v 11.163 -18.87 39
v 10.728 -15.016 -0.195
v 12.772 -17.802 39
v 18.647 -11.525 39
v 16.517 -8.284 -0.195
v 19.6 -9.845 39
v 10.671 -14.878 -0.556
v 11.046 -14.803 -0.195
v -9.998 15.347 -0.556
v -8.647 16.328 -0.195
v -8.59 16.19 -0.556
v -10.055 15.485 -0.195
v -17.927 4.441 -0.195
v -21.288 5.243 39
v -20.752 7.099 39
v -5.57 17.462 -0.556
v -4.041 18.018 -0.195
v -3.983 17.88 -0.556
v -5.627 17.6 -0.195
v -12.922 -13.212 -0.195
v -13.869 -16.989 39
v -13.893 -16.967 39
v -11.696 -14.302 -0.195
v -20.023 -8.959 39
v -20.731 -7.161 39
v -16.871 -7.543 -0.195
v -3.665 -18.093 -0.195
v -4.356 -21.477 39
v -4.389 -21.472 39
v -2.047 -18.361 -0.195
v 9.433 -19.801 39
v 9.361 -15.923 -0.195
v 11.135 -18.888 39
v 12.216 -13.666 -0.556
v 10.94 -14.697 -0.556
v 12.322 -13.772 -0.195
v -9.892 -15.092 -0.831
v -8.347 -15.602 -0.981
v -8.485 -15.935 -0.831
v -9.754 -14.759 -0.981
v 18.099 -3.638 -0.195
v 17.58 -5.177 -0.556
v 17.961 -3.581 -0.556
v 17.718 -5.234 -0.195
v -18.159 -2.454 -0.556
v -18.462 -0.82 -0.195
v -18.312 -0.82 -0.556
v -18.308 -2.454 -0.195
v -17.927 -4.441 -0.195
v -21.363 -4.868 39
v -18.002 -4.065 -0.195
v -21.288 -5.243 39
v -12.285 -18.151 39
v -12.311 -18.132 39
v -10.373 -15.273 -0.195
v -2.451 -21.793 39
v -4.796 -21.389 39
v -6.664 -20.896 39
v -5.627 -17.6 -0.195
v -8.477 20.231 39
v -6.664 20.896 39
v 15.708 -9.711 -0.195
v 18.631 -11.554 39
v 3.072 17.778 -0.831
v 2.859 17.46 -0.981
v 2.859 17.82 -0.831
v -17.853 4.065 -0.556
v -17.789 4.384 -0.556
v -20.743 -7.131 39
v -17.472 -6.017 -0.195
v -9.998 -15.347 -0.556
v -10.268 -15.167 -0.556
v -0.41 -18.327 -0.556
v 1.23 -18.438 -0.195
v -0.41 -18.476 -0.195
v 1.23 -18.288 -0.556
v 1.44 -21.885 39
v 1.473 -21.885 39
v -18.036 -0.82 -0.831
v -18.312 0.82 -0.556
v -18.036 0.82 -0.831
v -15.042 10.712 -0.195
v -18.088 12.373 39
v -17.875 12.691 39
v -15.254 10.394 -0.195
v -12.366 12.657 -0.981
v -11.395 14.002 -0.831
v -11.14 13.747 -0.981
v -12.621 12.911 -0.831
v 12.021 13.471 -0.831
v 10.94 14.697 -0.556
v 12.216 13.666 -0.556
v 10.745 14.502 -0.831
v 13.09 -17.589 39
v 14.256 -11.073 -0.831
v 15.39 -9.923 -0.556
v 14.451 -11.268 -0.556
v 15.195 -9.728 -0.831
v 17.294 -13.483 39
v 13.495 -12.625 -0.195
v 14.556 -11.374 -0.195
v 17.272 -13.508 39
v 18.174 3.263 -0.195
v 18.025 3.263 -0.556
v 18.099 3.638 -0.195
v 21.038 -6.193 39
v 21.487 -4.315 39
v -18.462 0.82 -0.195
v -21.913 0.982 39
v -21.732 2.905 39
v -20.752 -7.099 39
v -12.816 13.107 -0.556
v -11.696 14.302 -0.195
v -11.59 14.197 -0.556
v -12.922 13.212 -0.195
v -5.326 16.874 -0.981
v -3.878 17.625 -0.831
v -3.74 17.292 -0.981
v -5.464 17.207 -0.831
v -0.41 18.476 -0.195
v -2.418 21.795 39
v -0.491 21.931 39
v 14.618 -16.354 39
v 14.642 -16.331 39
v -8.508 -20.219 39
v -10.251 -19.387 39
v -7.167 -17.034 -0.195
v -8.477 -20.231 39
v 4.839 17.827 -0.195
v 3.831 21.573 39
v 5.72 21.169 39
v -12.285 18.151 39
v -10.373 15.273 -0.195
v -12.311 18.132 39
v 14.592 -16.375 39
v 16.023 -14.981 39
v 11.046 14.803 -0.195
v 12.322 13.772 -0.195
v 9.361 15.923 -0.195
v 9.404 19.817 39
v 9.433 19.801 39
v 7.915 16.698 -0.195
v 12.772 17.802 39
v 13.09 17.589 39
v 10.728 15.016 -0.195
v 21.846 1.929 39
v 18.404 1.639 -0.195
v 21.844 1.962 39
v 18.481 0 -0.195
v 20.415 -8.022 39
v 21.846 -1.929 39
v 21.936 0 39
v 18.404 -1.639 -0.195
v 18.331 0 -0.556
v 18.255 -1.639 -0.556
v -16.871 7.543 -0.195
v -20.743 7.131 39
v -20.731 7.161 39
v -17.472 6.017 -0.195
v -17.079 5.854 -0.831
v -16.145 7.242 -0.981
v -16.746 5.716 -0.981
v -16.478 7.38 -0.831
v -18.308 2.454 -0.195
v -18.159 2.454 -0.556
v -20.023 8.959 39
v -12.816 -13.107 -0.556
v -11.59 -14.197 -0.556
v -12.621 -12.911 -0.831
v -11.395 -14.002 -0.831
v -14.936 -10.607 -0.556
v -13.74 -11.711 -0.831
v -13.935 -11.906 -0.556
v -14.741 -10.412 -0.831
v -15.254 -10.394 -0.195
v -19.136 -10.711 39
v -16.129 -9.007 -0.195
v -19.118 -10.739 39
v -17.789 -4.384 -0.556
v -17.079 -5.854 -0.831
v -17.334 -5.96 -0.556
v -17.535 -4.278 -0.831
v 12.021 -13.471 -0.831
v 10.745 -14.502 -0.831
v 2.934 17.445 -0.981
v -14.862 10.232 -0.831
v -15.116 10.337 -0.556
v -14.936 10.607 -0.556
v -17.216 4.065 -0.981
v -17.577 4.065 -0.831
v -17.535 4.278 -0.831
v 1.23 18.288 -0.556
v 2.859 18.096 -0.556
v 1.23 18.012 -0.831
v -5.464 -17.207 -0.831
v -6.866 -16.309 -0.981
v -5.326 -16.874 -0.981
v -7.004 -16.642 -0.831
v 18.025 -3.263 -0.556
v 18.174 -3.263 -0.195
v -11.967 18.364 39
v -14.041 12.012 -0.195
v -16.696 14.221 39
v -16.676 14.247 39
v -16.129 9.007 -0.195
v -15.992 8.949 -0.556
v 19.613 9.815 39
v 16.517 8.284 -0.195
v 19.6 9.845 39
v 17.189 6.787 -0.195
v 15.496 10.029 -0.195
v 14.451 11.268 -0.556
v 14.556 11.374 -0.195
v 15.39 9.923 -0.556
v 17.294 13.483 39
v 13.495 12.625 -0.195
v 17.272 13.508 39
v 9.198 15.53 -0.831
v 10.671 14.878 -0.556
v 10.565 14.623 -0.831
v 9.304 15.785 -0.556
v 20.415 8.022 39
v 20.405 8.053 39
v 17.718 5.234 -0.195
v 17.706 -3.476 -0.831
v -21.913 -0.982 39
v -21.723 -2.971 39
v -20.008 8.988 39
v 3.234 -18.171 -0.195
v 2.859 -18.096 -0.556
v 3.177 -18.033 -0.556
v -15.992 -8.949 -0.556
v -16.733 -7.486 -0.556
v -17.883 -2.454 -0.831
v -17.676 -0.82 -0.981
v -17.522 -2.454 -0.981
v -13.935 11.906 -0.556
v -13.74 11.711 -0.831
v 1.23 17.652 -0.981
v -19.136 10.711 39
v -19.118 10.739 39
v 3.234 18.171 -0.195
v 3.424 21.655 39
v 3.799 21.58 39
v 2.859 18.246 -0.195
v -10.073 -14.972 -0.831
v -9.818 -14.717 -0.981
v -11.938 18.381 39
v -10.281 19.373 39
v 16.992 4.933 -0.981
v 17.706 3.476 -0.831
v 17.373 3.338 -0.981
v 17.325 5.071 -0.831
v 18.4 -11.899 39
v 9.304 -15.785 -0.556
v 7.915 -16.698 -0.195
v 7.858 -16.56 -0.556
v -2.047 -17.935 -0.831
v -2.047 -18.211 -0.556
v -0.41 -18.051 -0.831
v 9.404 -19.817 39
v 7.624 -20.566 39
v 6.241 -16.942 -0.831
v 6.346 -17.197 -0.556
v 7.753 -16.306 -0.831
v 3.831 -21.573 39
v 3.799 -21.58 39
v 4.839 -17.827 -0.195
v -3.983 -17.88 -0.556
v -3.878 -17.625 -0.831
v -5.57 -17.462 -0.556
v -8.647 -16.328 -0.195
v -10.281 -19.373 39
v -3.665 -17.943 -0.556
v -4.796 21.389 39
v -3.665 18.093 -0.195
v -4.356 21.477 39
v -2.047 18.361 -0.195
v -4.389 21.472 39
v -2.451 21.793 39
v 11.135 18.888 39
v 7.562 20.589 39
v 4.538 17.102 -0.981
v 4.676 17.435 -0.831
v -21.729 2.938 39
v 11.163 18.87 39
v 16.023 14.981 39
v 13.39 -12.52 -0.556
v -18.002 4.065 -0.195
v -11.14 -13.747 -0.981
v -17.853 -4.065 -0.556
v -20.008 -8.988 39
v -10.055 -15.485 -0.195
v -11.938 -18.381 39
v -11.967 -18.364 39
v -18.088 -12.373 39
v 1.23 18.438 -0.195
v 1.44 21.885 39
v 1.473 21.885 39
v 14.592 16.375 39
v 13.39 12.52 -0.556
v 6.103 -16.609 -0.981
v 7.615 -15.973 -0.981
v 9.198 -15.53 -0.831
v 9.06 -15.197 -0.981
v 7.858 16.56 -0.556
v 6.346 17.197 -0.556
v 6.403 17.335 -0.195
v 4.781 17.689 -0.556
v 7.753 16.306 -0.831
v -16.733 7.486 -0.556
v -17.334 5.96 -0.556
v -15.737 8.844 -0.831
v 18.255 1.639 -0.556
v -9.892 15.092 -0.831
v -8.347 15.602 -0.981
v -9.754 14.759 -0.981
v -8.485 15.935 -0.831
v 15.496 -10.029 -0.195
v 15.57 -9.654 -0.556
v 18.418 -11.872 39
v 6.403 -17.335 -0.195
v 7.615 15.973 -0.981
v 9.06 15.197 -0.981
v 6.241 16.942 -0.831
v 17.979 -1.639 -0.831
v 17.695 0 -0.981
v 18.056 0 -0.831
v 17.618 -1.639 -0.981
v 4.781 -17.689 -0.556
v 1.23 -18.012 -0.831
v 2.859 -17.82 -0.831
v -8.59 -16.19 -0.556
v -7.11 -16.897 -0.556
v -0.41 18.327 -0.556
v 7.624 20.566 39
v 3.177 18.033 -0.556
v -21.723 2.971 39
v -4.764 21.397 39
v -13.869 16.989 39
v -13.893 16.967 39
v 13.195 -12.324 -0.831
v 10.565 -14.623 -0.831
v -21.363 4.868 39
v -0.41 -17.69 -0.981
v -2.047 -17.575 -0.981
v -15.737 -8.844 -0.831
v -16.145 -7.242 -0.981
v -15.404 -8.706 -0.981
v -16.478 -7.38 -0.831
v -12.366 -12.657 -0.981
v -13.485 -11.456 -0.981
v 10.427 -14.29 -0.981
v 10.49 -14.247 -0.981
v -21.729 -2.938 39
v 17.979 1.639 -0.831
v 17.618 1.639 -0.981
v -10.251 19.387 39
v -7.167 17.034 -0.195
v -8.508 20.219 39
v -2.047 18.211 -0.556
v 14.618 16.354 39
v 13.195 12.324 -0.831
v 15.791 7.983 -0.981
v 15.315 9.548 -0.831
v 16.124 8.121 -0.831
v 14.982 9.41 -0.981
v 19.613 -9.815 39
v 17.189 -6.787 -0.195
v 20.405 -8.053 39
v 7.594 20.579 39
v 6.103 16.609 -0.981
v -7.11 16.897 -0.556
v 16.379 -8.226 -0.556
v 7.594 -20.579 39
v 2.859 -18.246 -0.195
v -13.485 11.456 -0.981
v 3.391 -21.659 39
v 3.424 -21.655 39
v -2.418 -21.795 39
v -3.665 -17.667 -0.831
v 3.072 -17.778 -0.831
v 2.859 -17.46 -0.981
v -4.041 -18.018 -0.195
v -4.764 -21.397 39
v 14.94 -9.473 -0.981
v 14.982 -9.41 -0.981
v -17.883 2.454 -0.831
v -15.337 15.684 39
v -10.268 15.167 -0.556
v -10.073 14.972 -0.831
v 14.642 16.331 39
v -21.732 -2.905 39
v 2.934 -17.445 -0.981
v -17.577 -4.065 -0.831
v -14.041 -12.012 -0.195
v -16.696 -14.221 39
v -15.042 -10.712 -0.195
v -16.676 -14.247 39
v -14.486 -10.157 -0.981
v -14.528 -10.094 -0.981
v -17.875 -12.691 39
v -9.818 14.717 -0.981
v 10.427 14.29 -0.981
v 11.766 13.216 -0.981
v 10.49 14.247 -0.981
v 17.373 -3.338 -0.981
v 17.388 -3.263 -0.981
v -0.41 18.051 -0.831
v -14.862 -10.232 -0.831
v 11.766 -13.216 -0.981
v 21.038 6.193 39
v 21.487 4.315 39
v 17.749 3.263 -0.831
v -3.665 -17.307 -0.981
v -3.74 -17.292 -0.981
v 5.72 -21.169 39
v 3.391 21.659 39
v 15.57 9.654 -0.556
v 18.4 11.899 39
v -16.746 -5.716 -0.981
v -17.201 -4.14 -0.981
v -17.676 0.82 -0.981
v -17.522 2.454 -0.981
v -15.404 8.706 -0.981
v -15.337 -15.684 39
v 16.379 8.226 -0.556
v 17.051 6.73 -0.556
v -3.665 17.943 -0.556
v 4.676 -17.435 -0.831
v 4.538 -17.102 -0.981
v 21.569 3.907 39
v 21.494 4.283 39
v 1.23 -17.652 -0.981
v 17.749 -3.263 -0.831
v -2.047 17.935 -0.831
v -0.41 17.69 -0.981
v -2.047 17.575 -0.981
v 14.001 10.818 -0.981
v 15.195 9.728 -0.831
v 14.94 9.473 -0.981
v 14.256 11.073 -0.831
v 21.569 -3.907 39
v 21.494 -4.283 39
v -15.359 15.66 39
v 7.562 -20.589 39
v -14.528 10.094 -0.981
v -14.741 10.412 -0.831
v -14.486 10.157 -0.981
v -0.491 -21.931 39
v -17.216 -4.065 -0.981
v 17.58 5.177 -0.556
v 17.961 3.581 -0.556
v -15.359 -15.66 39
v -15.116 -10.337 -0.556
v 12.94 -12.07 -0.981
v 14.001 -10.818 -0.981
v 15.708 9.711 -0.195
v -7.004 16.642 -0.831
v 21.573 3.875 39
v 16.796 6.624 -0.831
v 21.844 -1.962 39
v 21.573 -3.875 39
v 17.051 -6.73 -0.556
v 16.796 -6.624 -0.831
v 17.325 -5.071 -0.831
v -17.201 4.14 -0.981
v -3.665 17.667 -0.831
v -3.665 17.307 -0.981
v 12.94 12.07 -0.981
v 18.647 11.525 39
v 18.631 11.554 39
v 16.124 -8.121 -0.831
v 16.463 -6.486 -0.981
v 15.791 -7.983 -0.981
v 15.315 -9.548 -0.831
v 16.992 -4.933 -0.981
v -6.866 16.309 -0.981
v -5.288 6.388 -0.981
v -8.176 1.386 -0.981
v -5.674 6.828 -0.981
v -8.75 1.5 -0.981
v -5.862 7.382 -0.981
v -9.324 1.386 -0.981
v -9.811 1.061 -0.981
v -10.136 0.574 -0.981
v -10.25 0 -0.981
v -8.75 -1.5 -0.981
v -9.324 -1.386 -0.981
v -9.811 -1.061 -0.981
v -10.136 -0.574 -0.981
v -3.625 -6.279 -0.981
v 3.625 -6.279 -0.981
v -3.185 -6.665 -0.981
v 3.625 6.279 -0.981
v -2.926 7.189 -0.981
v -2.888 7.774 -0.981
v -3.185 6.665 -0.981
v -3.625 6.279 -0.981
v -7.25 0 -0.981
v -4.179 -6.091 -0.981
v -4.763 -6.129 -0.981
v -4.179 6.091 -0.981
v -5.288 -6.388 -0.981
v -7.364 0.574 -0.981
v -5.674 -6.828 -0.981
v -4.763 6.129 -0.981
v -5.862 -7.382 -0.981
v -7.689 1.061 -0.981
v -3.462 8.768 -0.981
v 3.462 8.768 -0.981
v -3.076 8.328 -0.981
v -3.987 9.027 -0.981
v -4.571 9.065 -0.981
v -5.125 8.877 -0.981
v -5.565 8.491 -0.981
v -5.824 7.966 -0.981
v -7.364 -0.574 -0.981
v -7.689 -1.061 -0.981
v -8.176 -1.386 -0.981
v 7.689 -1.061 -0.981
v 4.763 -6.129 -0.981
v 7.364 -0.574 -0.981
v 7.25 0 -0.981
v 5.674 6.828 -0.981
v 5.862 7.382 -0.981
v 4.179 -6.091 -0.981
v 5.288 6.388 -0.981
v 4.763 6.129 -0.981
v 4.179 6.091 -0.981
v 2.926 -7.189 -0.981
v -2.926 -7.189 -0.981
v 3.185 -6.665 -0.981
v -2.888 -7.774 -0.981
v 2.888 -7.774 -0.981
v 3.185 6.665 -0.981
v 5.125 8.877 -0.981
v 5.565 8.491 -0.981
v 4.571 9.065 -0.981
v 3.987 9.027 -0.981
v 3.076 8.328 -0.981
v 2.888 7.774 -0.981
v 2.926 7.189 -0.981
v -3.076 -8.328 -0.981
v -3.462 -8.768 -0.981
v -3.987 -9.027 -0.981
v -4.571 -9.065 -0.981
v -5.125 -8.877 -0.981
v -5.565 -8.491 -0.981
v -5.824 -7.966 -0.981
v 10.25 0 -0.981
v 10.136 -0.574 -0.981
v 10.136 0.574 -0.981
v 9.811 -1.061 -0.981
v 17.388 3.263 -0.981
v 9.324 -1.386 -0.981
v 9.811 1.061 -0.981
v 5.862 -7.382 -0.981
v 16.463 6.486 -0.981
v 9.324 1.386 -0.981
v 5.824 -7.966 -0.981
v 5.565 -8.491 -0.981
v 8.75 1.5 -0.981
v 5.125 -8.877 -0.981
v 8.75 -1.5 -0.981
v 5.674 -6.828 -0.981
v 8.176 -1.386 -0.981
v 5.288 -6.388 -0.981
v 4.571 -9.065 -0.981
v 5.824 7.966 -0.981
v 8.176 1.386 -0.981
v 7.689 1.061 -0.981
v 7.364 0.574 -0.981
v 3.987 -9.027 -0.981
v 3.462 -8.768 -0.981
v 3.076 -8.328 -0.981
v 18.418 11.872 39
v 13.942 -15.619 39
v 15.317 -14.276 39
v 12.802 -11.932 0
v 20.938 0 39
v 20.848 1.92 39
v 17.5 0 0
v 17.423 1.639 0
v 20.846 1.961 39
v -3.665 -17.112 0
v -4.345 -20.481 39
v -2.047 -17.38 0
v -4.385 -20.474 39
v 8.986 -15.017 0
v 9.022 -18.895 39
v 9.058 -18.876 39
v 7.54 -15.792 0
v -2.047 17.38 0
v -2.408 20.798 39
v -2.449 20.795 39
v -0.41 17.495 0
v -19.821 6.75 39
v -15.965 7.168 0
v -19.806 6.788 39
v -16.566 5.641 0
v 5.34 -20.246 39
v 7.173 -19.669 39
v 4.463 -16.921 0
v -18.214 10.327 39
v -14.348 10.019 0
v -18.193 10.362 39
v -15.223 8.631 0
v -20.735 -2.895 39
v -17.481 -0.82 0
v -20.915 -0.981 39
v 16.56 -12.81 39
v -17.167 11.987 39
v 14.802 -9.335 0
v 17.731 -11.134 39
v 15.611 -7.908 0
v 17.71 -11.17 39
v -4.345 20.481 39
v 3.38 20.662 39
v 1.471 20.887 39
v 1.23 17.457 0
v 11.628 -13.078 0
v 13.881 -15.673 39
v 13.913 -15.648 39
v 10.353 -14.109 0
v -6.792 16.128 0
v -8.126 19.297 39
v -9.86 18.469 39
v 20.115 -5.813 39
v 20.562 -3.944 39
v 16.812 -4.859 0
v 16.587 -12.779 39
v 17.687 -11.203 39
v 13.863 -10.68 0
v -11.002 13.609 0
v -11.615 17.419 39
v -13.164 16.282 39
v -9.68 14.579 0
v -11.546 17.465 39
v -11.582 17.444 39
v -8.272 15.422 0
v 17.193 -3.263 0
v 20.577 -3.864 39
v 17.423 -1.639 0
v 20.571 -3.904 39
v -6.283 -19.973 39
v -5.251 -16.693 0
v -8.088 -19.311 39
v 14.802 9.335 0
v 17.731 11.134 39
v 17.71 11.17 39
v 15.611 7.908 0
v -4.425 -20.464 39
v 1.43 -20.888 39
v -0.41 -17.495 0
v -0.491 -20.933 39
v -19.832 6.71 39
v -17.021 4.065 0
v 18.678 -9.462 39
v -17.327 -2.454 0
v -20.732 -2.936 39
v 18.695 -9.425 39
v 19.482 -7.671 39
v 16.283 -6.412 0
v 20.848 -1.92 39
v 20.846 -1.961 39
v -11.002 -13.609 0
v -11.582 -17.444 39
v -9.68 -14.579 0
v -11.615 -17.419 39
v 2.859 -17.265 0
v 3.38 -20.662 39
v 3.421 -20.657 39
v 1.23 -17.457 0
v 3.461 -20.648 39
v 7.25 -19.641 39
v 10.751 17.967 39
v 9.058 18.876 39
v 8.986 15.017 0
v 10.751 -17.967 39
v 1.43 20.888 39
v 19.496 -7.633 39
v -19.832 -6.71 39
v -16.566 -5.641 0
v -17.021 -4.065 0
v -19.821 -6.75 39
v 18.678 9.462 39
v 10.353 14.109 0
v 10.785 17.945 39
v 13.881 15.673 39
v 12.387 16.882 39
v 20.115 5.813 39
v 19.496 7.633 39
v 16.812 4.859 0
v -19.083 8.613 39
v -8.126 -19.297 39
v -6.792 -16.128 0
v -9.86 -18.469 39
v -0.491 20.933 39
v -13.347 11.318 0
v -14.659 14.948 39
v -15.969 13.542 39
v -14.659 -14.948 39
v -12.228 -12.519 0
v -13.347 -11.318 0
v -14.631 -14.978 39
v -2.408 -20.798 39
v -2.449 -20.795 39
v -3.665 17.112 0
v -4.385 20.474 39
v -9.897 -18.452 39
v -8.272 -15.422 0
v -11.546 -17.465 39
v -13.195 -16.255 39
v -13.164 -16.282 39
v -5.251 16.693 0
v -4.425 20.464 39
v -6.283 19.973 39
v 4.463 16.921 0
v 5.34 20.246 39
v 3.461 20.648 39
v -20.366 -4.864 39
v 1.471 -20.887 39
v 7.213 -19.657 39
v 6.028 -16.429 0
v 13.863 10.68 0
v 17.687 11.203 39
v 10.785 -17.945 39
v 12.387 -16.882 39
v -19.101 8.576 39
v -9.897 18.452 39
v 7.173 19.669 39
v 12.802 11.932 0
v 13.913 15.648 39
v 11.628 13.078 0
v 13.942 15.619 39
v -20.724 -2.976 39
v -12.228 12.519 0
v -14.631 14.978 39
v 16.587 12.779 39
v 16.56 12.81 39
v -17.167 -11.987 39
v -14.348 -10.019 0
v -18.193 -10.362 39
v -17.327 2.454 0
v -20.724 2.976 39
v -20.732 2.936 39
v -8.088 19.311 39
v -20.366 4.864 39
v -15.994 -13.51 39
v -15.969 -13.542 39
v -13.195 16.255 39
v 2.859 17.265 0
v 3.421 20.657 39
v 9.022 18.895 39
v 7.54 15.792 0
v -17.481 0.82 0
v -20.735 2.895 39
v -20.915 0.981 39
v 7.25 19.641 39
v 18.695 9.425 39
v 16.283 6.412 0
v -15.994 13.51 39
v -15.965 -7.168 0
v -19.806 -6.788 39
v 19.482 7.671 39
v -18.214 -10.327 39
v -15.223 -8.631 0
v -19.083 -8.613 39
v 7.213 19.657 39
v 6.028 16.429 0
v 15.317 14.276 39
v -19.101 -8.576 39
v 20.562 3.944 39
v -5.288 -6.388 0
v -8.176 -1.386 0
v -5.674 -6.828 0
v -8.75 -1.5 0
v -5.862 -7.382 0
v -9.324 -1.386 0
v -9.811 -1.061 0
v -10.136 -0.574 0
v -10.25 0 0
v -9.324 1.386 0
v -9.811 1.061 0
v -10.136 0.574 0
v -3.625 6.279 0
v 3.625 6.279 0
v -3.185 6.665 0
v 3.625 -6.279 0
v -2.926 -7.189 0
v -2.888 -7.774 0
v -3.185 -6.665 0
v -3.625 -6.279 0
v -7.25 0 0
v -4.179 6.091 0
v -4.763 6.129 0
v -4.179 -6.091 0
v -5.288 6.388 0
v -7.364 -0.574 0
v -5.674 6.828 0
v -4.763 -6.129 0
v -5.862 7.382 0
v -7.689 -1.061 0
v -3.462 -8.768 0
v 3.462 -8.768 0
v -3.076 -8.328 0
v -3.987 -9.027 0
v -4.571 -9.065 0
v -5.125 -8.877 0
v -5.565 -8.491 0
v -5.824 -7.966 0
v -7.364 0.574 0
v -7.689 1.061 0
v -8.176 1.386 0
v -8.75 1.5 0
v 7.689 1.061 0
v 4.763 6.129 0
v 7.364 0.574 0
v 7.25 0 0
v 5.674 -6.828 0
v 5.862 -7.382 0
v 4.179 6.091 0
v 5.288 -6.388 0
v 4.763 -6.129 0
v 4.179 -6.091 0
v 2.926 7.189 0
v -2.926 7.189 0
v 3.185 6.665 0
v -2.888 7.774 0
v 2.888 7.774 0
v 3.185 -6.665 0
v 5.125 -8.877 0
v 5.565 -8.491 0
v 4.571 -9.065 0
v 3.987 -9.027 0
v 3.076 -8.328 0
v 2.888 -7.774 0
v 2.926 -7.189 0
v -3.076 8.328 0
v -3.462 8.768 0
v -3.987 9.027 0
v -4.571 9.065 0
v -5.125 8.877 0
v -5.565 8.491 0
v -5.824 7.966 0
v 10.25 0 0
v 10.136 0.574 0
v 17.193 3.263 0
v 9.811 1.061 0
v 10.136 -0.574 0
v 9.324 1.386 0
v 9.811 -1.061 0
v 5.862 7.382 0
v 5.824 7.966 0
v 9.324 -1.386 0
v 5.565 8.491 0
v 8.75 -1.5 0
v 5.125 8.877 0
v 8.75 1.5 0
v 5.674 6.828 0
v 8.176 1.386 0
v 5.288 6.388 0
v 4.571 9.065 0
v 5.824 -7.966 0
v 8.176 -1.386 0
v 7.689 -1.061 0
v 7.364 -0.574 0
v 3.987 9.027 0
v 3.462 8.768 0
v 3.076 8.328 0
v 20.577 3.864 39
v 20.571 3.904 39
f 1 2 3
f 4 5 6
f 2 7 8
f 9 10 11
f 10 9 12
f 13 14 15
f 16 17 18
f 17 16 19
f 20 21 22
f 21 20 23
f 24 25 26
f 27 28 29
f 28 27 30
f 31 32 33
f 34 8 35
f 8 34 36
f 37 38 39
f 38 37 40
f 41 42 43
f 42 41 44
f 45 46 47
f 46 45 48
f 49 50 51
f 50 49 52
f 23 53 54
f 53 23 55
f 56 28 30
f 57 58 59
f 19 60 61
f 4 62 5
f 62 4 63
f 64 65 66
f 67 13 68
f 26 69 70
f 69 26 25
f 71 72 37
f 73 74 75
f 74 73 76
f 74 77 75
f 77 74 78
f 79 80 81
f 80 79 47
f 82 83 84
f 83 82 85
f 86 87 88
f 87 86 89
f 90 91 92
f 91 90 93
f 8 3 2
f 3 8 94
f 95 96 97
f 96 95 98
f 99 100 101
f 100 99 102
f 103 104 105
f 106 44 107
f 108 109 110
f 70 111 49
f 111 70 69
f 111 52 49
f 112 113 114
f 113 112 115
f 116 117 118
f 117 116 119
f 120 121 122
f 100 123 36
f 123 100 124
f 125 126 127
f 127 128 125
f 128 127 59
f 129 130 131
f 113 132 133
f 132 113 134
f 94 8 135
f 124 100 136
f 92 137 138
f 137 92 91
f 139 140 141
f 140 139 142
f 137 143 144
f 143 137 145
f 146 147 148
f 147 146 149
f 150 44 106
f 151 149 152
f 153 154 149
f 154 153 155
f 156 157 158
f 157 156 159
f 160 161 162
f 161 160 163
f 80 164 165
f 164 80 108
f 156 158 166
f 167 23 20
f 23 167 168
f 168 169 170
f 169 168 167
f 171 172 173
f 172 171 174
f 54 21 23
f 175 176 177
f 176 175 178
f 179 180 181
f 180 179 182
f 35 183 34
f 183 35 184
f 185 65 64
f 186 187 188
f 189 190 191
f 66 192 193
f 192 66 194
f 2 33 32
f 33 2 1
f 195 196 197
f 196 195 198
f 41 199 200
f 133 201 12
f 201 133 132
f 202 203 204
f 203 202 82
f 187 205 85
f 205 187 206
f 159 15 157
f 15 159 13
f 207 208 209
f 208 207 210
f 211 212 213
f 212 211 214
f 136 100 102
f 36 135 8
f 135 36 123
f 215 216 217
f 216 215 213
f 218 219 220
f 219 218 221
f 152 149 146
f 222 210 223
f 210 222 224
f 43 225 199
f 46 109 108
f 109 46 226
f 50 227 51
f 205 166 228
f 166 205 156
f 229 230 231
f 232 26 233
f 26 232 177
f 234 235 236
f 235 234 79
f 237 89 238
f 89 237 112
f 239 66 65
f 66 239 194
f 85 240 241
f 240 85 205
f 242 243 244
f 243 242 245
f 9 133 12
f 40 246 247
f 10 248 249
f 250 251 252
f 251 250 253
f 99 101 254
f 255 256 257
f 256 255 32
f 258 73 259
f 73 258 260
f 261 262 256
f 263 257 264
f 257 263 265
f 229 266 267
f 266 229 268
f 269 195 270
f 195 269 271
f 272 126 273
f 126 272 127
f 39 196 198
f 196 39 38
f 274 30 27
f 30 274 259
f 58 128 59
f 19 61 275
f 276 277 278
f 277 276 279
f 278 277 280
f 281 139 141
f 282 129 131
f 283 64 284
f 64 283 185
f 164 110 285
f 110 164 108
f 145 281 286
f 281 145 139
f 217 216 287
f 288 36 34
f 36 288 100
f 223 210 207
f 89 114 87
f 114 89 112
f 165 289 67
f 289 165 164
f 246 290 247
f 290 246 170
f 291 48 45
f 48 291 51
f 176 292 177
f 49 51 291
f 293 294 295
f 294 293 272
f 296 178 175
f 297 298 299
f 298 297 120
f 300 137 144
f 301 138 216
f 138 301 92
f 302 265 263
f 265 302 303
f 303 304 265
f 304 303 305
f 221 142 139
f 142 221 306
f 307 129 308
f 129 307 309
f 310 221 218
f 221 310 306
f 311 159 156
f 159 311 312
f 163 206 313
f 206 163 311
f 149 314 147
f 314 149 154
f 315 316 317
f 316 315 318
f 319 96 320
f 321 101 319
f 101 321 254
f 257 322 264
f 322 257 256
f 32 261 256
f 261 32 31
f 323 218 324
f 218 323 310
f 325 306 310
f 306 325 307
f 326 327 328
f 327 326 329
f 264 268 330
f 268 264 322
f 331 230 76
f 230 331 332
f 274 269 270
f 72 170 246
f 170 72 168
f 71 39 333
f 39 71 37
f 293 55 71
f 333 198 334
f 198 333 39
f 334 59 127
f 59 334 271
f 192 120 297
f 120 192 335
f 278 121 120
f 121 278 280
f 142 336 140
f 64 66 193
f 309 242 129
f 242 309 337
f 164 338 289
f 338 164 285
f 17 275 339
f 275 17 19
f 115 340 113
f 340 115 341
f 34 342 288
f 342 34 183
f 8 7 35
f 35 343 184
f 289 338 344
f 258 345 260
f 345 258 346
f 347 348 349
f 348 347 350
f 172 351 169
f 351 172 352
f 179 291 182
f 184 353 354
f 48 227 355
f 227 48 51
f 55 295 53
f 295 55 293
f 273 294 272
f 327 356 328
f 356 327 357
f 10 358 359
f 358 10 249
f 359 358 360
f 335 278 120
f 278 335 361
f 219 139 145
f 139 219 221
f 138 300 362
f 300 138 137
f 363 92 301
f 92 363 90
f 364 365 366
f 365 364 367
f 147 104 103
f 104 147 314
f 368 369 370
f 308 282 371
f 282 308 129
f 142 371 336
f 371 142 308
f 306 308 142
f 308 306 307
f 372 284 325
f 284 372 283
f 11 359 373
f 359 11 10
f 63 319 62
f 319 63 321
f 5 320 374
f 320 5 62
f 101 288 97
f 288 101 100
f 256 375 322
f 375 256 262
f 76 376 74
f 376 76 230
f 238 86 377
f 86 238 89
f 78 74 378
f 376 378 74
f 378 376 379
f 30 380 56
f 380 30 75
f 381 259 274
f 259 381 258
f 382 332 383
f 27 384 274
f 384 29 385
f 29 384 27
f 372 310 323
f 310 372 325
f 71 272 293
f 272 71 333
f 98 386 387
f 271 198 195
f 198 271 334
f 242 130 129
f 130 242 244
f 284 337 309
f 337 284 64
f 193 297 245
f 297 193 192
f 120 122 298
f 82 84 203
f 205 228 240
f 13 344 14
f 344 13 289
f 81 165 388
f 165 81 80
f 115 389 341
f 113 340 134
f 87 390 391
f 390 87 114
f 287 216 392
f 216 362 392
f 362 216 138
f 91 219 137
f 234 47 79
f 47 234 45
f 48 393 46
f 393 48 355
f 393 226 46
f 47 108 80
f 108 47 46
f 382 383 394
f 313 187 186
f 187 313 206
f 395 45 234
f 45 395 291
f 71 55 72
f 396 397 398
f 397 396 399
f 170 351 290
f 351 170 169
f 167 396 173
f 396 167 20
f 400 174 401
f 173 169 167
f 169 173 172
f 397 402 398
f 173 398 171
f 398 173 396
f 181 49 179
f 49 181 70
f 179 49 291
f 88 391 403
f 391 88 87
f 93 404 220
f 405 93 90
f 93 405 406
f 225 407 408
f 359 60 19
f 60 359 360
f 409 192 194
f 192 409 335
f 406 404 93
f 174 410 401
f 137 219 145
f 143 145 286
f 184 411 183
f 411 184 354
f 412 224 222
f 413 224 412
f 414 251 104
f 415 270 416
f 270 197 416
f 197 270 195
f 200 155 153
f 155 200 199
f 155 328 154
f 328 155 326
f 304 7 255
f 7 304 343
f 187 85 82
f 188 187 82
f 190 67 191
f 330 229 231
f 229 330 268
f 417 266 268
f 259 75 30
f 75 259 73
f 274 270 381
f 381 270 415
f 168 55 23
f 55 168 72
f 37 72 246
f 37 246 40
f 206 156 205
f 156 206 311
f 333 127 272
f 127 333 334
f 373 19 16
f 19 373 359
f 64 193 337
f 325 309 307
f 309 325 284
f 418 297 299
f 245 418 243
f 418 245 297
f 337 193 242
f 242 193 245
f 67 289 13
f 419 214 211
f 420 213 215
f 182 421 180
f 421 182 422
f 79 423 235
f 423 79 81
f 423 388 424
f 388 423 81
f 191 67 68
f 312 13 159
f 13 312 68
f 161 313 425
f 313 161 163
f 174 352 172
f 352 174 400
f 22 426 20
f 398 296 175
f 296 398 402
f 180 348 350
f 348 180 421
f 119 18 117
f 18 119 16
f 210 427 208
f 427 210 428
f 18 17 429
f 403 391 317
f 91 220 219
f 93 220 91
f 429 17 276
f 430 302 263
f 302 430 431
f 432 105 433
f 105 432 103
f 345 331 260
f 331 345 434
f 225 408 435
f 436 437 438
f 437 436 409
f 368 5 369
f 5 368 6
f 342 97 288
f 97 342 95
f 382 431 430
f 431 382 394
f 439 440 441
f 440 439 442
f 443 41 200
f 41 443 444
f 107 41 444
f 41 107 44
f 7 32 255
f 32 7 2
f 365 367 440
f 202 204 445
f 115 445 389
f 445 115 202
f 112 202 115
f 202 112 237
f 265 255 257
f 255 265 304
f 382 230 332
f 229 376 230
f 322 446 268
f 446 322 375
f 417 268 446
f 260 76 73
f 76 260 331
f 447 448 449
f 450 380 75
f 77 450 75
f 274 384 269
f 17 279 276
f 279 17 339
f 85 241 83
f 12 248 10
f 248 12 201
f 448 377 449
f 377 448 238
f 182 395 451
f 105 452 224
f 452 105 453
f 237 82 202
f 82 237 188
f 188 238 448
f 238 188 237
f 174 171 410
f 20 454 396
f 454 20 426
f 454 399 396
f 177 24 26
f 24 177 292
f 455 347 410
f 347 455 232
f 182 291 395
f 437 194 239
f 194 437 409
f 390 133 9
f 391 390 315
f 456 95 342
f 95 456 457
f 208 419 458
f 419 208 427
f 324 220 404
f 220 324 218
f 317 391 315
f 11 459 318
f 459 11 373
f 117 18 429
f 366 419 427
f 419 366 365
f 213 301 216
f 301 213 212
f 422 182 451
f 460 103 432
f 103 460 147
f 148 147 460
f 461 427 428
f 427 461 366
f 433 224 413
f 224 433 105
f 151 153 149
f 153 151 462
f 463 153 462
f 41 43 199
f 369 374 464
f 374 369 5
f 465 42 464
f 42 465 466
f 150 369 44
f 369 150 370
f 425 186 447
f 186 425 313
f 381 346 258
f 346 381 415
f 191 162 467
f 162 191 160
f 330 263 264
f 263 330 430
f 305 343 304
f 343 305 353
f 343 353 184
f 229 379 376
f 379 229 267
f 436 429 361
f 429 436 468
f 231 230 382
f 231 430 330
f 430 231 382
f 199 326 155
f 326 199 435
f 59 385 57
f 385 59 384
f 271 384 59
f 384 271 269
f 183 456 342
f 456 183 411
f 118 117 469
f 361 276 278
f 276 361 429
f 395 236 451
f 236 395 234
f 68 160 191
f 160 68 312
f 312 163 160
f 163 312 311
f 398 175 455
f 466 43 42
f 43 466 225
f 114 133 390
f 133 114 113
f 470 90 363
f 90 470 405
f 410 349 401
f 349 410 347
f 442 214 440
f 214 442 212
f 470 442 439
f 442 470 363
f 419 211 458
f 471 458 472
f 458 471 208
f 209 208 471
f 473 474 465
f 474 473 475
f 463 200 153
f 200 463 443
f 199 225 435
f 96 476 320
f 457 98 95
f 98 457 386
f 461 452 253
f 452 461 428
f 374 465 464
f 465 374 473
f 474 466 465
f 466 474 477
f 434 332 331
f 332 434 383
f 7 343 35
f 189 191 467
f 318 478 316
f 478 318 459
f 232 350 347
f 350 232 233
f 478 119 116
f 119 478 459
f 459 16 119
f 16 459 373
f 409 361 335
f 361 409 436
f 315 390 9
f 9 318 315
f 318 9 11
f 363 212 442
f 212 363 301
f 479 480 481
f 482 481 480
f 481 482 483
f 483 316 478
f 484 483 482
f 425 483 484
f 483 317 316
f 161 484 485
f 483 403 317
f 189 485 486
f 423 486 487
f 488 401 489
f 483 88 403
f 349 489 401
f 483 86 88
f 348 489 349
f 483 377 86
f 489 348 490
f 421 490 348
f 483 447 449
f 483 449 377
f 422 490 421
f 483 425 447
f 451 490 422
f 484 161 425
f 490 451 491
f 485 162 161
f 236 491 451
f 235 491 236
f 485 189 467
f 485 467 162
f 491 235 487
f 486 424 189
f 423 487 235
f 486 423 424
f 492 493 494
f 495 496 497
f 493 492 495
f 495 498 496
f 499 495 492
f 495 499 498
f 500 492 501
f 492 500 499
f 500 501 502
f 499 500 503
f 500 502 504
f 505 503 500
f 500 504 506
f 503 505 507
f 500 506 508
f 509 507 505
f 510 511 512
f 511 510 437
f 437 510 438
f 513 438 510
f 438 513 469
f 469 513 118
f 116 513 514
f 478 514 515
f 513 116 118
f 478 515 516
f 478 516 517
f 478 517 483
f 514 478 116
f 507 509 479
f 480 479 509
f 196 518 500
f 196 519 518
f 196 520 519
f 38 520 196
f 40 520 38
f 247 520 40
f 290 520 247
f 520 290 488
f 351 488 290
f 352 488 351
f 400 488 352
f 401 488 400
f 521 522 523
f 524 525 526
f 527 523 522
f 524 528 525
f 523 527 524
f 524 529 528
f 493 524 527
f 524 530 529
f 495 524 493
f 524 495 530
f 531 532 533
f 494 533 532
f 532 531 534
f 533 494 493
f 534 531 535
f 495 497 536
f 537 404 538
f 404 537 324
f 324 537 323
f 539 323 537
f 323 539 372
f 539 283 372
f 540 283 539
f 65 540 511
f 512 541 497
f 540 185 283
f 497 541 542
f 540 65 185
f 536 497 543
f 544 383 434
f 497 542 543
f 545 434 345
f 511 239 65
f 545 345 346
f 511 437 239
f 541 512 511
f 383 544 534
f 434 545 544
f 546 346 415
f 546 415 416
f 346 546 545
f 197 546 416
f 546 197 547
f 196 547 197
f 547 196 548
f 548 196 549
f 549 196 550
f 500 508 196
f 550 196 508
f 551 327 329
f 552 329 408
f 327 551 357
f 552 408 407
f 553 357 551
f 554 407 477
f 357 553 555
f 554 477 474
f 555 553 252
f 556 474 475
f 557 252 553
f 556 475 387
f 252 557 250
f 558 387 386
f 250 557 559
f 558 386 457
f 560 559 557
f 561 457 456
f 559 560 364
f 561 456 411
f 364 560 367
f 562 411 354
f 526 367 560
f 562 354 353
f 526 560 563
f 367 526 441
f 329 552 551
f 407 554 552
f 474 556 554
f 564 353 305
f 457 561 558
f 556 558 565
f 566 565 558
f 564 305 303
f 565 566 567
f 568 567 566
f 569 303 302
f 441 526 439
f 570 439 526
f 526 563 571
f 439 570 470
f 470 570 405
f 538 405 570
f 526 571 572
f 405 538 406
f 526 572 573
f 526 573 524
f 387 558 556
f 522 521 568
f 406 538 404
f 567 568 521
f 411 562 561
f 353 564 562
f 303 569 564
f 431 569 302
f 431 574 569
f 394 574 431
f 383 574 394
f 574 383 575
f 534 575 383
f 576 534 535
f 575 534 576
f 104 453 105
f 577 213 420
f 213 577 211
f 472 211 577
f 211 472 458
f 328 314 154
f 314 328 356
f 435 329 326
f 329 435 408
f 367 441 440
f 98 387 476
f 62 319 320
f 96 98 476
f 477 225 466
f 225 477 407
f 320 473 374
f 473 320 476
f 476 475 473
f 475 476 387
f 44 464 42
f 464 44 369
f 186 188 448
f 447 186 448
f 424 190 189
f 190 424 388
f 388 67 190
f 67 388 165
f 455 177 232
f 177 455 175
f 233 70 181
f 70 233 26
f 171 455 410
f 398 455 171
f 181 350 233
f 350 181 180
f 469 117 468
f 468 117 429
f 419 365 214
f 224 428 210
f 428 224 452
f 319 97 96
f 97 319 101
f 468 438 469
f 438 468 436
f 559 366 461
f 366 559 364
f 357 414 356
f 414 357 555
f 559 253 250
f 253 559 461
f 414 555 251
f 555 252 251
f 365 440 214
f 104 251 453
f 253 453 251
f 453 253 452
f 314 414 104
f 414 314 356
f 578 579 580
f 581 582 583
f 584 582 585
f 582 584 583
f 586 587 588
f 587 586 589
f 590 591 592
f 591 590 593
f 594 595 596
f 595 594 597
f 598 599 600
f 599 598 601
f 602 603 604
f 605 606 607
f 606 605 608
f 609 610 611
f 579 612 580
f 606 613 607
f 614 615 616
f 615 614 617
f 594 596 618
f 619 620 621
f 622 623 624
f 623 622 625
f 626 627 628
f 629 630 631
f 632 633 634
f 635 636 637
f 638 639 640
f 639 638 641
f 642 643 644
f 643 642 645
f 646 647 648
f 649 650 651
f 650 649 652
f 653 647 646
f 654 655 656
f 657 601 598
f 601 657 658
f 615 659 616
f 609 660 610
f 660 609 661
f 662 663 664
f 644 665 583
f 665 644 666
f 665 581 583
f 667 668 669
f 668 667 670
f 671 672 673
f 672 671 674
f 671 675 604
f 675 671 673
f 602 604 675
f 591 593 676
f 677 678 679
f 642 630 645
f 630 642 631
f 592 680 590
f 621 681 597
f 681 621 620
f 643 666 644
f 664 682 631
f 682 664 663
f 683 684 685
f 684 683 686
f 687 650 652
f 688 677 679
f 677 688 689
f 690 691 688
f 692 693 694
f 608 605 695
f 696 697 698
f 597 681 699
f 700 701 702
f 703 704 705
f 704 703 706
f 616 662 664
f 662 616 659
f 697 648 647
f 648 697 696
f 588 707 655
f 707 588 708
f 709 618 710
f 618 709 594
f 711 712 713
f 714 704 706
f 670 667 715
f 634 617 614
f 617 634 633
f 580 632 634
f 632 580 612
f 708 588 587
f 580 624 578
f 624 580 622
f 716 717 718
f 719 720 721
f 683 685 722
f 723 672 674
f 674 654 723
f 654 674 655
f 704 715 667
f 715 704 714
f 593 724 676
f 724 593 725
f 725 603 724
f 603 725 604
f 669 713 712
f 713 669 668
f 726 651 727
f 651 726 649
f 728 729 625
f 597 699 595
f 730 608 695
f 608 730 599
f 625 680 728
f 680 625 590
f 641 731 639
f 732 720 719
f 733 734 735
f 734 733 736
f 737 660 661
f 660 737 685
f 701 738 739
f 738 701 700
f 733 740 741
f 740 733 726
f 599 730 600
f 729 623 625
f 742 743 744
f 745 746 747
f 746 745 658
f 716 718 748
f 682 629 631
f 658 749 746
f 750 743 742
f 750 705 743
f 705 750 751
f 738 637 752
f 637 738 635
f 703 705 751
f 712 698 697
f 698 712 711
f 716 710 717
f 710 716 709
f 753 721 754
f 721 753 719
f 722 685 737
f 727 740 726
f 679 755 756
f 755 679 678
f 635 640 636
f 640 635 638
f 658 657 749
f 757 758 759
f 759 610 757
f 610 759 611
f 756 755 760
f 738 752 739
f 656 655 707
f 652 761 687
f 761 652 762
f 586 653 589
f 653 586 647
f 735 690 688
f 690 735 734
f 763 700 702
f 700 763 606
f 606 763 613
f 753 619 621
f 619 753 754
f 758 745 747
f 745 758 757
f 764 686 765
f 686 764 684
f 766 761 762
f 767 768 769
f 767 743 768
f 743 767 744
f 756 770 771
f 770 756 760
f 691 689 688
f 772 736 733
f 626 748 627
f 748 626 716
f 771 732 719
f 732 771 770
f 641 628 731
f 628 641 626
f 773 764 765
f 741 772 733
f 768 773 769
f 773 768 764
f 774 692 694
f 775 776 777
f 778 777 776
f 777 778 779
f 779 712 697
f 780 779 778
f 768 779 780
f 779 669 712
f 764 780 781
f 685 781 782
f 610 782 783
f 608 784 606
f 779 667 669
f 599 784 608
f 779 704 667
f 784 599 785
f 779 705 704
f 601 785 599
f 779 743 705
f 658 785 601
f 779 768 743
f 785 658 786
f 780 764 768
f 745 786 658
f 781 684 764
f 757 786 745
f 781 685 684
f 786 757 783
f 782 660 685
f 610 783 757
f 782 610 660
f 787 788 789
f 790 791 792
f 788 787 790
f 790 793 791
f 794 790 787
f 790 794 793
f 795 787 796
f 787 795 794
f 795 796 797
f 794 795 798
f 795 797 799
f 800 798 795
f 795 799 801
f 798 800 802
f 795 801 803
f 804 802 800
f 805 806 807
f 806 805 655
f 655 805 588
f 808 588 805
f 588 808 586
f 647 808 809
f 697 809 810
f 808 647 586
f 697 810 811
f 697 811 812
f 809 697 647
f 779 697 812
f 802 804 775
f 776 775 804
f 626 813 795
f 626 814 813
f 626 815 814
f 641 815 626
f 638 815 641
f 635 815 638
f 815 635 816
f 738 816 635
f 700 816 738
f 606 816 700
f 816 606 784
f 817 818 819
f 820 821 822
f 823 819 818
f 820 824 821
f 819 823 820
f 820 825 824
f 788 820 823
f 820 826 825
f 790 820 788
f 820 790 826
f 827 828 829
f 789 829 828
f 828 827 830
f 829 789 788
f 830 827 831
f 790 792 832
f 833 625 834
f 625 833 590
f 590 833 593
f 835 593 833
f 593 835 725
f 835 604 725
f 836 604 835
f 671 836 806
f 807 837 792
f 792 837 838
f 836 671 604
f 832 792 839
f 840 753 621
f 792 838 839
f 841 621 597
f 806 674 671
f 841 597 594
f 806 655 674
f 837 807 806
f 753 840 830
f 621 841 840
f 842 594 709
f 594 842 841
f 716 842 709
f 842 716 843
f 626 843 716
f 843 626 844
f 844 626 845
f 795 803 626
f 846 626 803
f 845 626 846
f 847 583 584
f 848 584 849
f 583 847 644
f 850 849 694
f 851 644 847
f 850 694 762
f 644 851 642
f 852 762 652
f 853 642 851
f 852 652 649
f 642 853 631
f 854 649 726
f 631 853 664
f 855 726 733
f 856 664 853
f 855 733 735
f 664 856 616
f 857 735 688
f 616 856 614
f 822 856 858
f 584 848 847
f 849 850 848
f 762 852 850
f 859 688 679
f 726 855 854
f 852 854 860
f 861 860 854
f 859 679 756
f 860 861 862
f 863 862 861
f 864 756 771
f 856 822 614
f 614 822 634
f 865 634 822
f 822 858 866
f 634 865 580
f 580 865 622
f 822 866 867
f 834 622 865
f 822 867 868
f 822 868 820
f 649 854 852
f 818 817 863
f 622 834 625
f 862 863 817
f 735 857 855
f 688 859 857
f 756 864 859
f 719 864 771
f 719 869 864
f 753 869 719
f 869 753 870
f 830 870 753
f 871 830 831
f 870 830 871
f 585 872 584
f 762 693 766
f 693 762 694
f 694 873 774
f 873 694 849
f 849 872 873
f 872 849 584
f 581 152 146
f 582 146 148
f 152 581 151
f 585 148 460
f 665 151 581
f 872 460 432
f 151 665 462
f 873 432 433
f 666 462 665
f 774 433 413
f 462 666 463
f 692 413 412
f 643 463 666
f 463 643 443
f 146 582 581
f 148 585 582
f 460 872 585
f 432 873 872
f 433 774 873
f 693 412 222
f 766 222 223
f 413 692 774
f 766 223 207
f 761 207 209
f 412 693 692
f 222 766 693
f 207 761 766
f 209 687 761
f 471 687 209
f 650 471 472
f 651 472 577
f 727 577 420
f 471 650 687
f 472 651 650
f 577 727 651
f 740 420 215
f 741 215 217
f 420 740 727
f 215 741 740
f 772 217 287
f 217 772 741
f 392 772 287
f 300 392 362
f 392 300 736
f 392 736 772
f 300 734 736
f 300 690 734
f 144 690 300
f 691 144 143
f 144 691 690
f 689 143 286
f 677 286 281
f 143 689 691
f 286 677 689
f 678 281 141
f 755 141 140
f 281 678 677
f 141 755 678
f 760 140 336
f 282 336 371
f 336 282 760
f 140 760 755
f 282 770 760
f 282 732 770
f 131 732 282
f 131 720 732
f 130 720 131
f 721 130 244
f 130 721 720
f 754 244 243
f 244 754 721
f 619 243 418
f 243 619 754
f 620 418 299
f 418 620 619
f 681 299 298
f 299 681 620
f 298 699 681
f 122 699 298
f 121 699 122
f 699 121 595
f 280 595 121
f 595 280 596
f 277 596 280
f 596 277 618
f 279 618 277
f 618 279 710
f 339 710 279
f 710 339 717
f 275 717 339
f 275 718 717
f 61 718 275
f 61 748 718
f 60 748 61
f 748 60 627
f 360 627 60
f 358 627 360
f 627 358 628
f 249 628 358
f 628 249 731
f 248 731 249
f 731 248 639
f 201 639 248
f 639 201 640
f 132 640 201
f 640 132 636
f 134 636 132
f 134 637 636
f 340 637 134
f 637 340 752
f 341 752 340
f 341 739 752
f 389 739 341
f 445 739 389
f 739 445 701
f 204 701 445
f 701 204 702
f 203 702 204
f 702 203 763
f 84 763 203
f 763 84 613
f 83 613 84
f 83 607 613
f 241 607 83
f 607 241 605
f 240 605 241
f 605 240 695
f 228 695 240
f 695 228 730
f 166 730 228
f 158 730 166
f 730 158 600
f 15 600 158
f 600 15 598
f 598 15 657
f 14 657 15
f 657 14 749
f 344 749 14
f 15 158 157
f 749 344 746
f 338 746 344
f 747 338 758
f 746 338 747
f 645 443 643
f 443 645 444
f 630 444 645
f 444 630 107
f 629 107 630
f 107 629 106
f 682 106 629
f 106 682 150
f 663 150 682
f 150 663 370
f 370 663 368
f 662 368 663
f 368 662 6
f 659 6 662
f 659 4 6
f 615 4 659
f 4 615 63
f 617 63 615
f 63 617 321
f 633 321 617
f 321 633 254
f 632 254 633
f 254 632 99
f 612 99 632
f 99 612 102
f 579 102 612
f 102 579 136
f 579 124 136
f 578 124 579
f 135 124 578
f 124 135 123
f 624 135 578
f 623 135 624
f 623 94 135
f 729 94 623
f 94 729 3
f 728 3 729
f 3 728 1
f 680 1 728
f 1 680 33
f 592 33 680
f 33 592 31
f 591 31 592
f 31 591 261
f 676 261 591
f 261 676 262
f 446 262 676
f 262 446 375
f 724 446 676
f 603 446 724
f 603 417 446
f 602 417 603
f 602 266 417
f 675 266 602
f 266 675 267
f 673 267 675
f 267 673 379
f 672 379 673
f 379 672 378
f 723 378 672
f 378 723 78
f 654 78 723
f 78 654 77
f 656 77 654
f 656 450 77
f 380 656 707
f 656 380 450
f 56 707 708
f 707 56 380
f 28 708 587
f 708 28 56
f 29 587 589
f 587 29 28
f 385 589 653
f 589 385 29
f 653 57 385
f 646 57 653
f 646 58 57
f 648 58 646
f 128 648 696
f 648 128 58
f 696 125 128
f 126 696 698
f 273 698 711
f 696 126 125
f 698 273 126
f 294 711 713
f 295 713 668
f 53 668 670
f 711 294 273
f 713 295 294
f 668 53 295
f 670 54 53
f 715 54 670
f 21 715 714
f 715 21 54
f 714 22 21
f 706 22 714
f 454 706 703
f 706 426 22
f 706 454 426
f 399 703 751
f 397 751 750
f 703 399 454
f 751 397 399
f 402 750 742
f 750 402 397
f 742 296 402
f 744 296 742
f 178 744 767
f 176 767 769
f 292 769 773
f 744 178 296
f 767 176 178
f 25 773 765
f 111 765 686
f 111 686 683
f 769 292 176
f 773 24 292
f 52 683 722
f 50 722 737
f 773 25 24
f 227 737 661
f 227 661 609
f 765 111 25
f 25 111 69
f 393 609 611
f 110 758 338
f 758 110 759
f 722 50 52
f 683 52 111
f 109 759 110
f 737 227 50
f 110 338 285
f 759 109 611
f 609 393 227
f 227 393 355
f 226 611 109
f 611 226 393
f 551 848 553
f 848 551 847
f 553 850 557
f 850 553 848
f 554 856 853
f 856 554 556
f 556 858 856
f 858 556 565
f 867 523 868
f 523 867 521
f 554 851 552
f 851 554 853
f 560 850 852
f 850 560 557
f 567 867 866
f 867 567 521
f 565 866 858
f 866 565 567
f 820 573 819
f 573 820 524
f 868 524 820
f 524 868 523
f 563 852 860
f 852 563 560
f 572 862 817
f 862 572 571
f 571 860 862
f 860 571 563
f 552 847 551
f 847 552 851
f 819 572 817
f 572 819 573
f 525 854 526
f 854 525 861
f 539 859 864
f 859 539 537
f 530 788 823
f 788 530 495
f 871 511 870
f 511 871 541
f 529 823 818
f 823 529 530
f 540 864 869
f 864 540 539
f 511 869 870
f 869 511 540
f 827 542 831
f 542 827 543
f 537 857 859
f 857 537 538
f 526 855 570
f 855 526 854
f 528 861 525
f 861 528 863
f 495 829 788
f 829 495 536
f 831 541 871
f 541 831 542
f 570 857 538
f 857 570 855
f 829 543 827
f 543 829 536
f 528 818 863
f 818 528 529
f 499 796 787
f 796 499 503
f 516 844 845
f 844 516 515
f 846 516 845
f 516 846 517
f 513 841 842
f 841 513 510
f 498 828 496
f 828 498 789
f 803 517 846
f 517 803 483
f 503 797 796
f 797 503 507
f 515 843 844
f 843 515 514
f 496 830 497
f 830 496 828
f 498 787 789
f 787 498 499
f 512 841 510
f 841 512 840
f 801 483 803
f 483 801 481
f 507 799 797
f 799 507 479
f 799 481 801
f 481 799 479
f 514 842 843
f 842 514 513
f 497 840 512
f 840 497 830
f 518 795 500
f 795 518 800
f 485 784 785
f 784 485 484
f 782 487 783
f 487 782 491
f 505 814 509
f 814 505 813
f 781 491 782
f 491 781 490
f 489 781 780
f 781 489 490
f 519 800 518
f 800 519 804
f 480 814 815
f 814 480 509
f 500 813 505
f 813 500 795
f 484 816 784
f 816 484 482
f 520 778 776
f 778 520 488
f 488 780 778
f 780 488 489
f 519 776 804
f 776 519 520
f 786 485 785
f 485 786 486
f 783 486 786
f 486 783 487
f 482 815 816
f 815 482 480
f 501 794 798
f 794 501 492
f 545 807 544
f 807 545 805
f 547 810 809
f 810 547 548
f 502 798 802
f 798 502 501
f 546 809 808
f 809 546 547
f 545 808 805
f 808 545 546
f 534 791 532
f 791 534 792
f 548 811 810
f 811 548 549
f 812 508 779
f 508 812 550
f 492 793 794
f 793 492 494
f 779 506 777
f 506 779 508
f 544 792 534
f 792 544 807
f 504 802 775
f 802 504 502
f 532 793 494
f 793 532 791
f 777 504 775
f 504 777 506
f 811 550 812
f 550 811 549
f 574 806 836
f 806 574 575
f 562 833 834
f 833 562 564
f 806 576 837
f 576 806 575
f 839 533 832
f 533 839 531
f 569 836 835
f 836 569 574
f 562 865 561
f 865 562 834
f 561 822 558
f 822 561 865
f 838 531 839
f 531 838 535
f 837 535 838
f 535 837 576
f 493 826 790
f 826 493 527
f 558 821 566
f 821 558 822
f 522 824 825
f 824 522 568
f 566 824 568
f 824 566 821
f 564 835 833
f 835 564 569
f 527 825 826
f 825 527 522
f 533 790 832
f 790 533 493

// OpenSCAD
//simple plant pot

//Diameter of base in mm
baseD = 35;

//Height of pot in mm
potH = 40;

// The sides are this many degrees from verticle
sideSlope = 10; //[0:1:90]

//Thickness of the pot size
potThick = 1;


/* [Holes in Base] */

// Number of holes
nHoles = 6;//[0:1:10]

// Size of Holes diameter in mm
sHoles = 3;//


difference() {
    pot();
    holes(nHoles, sHoles);
}

// preview[view:south, tilt:top]

module holes(n, s){
    for(i = [0:n]){
        rotate([0,0,i*360/n]) translate([baseD/4,0,0]) cylinder(d=s, h=2*potThick, center=true, $fn=16);
    }
}

module pot(){
difference(){
minkowski(){    
cylinder(d1=baseD, d2=baseD+potH*tan(sideSlope) , h=potH, $fa=3);
sphere(r=potThick, $fn=16);
}//!minkowski
cylinder(d1=baseD, d2=baseD+potH*tan(sideSlope) , h=potH, $fa=3);
//slice top off
translate([0,0,potH]) cylinder(d=2*baseD, h= 2*potThick, center=true);

    
}//!diff
}
